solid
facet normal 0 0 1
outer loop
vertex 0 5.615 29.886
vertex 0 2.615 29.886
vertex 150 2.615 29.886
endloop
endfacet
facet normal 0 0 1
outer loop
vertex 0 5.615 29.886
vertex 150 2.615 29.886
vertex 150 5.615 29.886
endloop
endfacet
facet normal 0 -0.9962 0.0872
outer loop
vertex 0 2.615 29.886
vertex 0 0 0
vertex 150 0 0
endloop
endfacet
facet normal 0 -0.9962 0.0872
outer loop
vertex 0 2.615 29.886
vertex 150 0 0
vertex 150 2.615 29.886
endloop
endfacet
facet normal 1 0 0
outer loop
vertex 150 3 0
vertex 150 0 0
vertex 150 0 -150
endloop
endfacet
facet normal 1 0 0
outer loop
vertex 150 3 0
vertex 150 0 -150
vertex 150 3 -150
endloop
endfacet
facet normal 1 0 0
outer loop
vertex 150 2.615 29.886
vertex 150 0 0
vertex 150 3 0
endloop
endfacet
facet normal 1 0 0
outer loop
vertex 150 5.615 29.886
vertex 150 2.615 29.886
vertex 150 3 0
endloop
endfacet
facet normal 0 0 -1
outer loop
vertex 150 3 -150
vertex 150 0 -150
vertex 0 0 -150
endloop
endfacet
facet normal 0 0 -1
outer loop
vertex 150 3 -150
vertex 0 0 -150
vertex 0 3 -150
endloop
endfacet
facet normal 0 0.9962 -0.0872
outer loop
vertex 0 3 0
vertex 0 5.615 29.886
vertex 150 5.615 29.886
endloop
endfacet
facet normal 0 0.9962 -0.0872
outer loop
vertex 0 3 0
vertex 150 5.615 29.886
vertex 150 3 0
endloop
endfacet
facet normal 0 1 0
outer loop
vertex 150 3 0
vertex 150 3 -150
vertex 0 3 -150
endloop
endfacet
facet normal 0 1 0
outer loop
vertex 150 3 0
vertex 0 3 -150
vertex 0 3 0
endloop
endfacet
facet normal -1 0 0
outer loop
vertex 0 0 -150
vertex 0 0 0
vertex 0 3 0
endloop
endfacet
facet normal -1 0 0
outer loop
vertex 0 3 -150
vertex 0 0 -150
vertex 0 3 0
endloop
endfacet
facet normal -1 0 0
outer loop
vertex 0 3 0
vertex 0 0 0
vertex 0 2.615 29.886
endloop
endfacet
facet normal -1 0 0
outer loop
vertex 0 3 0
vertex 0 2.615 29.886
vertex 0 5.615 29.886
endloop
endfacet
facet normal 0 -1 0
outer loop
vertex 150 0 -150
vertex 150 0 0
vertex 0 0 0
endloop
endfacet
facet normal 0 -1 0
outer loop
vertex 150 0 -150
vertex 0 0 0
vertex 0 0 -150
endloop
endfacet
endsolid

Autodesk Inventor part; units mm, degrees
ref_plane "YZ Plane" through (0, 0, 0) normal (1, 0, 0) x (0, 1, 0)
ref_plane "XZ Plane" through (0, 0, 0) normal (0, 1, 0) x (-1, 0, 0)
ref_plane "XY Plane" through (0, 0, 0) normal (0, 0, 1) x (1, 0, 0)
sketch "スケッチ1" plane through (0, 0, 0) normal (1, 0, 0) x (0, 1, 0)
  line L0 (0, 0) -> (2.6147, 29.8858)
  line L1 (0, 0) -> (30, 0) construction
  line L2 (2.6147, 29.8858) -> (5.6147, 29.8858)
  line L3 (5.6147, 29.8858) -> (3, 0)
  line L4 (3, 0) -> (0, 0)
  dimension "d0" = 30
  dimension "d1" = 85
  dimension "d2" = 3
  dimension "d3" = 95
  dimension "d4" = 30
  dimension "d5" = 85
sketch "スケッチ2" plane through (0, 0, 0) normal (1, 0, 0) x (0, 1, 0)
  point P0 (0, 0)
extrude "押し出し1" add sketch "スケッチ1" along normal blind 150
sketch "スケッチ3" plane through (150, 0, 0) normal (1, 0, 0) x (0, 0, -1)
  line L0 (0, 0) -> (150, 0)
  line L1 (150, 0) -> (150, 3)
  line L2 (150, 3) -> (0, 3)
  line L3 (0, 3) -> (0, 0)
  dimension "d8" = 150
  dimension "d9" = 3
extrude "押し出し2" add sketch "スケッチ3" against normal blind 150
properties part number "NHK_t0_15"
